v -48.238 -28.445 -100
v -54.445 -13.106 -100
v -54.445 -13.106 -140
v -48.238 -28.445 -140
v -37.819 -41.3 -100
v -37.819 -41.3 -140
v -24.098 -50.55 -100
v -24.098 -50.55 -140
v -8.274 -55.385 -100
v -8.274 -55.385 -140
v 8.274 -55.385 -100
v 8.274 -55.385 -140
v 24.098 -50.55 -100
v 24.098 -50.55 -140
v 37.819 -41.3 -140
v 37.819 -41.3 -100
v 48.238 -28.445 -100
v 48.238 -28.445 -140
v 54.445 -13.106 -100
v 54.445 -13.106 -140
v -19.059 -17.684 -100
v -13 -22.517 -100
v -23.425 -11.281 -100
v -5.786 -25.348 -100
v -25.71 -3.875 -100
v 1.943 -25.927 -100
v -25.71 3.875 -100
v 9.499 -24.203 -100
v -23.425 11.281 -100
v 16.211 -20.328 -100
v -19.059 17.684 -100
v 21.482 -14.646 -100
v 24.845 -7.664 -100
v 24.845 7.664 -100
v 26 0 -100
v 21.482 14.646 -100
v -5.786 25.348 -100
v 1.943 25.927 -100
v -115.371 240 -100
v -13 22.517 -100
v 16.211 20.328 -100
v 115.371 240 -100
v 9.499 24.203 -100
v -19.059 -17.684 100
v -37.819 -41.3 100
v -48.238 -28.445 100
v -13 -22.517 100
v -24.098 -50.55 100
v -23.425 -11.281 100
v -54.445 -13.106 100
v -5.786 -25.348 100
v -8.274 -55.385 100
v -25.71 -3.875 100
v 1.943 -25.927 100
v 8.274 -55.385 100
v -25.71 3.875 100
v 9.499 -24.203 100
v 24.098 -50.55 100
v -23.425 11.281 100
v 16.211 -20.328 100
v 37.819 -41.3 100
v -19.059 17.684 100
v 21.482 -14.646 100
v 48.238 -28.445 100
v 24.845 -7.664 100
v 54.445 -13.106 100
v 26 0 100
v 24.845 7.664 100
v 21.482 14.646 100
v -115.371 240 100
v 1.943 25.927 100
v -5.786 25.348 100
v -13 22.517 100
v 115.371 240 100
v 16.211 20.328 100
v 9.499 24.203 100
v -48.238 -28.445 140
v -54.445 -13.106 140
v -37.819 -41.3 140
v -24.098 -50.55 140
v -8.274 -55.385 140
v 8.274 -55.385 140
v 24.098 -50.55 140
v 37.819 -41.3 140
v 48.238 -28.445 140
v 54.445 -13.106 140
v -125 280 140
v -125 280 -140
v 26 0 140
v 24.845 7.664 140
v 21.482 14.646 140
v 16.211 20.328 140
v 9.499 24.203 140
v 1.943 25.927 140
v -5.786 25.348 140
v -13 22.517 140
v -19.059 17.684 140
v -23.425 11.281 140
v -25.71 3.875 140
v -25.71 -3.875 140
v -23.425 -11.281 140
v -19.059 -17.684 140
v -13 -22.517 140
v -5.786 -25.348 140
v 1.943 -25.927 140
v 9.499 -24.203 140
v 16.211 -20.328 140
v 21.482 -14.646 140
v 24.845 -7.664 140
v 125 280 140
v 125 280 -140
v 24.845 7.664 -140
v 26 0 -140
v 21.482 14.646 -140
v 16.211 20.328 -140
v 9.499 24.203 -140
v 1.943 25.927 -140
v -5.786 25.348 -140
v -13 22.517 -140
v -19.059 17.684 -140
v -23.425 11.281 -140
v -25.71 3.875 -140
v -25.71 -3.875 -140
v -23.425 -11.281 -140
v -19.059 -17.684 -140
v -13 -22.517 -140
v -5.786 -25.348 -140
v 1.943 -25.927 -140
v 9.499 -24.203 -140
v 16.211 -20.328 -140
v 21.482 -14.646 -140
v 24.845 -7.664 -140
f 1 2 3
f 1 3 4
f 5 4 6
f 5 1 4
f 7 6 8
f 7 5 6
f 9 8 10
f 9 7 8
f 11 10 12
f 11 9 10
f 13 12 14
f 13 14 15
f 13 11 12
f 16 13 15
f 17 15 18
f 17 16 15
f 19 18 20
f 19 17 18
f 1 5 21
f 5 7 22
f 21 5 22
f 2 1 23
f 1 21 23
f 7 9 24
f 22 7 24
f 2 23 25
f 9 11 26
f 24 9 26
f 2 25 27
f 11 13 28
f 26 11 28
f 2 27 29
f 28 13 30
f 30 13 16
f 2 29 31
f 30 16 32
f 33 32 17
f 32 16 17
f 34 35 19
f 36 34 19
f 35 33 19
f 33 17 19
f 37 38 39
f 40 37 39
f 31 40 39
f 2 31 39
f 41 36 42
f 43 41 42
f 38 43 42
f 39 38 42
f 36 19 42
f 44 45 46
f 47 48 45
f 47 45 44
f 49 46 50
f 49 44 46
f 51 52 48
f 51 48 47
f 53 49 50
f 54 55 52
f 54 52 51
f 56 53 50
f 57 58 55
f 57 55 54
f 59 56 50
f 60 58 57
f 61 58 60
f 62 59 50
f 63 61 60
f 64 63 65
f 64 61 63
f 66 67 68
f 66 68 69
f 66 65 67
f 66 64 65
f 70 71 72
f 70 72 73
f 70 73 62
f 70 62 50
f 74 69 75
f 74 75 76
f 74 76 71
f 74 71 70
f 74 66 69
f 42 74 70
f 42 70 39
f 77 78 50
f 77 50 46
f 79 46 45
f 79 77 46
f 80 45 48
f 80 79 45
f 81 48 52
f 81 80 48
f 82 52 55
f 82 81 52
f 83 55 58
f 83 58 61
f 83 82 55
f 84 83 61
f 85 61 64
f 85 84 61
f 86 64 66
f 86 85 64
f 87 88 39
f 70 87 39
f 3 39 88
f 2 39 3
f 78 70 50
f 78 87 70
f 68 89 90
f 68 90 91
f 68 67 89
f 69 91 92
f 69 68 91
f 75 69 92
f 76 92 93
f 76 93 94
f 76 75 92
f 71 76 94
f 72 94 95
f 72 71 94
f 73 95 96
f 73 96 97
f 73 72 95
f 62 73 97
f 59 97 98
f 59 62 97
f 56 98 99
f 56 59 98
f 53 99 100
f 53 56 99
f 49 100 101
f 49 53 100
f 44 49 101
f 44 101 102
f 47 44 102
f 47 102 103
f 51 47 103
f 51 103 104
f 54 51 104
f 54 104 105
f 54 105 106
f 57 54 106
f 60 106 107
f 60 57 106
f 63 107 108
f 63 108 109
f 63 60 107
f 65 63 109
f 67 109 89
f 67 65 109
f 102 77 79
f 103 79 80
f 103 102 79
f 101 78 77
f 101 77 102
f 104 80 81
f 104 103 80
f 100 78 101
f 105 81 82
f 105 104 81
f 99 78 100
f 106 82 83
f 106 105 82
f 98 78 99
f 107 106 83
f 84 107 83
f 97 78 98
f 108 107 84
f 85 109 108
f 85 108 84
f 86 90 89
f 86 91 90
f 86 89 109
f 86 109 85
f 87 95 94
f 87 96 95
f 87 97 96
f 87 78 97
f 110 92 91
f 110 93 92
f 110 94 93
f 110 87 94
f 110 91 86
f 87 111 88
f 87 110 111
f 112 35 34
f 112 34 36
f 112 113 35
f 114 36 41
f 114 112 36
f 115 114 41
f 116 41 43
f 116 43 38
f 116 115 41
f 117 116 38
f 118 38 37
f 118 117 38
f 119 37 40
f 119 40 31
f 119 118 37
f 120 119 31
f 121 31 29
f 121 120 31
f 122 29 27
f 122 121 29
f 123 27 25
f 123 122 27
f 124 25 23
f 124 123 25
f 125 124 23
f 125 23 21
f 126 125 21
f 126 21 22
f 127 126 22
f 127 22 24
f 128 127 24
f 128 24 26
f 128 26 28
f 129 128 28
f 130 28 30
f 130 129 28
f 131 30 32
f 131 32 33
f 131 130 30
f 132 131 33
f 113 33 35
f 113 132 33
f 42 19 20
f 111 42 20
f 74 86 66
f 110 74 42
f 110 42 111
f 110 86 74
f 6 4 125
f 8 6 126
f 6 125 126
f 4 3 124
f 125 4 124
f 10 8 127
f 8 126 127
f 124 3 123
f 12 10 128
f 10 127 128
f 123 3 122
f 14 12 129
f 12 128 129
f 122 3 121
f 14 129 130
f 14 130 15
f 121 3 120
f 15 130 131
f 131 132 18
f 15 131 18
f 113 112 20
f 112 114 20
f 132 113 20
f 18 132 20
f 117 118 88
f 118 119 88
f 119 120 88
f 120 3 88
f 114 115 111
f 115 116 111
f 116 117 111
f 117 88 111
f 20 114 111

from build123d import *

# Parameters (mm, degrees)
SKETCH1_R               = 26
BOSS_EXTRUDE1_DEPTH     = 140
SKETCH2_W               = 200
SKETCH2_H               = 296
CUT_EXTRUDE1_DEPTH      = 126
CUT_EXTRUDE1_DEPTH_BACK = 126


with BuildPart() as part:
    # Sketch1 → Boss-Extrude1 (new body, symmetric)
    with BuildSketch(Plane.XY):
        with BuildLine():
            Line((125, 280), (-125, 280))
            Line((-125, 280), (-54.44483322, -13.105729116))
            ThreePointArc((-54.44483322, -13.105729116), (0, -56), (54.44483322, -13.105729116))
            Line((54.44483322, -13.105729116), (125, 280))
        make_face()
        Circle(SKETCH1_R, mode=Mode.SUBTRACT)
    extrude(amount=BOSS_EXTRUDE1_DEPTH, both=True)

    # Sketch2 → Cut-Extrude1 (cut, two sides)
    with BuildSketch(Plane(origin=(0, 0, 0), x_dir=(0, 0, -1), z_dir=(1, 0, 0))) as cut_extrude1_sk:
        with Locations((0, 92)):
            Rectangle(SKETCH2_W, SKETCH2_H)
    extrude(amount=CUT_EXTRUDE1_DEPTH, mode=Mode.SUBTRACT)
    extrude(cut_extrude1_sk.sketch, amount=-CUT_EXTRUDE1_DEPTH_BACK, mode=Mode.SUBTRACT)


solid = part.part
